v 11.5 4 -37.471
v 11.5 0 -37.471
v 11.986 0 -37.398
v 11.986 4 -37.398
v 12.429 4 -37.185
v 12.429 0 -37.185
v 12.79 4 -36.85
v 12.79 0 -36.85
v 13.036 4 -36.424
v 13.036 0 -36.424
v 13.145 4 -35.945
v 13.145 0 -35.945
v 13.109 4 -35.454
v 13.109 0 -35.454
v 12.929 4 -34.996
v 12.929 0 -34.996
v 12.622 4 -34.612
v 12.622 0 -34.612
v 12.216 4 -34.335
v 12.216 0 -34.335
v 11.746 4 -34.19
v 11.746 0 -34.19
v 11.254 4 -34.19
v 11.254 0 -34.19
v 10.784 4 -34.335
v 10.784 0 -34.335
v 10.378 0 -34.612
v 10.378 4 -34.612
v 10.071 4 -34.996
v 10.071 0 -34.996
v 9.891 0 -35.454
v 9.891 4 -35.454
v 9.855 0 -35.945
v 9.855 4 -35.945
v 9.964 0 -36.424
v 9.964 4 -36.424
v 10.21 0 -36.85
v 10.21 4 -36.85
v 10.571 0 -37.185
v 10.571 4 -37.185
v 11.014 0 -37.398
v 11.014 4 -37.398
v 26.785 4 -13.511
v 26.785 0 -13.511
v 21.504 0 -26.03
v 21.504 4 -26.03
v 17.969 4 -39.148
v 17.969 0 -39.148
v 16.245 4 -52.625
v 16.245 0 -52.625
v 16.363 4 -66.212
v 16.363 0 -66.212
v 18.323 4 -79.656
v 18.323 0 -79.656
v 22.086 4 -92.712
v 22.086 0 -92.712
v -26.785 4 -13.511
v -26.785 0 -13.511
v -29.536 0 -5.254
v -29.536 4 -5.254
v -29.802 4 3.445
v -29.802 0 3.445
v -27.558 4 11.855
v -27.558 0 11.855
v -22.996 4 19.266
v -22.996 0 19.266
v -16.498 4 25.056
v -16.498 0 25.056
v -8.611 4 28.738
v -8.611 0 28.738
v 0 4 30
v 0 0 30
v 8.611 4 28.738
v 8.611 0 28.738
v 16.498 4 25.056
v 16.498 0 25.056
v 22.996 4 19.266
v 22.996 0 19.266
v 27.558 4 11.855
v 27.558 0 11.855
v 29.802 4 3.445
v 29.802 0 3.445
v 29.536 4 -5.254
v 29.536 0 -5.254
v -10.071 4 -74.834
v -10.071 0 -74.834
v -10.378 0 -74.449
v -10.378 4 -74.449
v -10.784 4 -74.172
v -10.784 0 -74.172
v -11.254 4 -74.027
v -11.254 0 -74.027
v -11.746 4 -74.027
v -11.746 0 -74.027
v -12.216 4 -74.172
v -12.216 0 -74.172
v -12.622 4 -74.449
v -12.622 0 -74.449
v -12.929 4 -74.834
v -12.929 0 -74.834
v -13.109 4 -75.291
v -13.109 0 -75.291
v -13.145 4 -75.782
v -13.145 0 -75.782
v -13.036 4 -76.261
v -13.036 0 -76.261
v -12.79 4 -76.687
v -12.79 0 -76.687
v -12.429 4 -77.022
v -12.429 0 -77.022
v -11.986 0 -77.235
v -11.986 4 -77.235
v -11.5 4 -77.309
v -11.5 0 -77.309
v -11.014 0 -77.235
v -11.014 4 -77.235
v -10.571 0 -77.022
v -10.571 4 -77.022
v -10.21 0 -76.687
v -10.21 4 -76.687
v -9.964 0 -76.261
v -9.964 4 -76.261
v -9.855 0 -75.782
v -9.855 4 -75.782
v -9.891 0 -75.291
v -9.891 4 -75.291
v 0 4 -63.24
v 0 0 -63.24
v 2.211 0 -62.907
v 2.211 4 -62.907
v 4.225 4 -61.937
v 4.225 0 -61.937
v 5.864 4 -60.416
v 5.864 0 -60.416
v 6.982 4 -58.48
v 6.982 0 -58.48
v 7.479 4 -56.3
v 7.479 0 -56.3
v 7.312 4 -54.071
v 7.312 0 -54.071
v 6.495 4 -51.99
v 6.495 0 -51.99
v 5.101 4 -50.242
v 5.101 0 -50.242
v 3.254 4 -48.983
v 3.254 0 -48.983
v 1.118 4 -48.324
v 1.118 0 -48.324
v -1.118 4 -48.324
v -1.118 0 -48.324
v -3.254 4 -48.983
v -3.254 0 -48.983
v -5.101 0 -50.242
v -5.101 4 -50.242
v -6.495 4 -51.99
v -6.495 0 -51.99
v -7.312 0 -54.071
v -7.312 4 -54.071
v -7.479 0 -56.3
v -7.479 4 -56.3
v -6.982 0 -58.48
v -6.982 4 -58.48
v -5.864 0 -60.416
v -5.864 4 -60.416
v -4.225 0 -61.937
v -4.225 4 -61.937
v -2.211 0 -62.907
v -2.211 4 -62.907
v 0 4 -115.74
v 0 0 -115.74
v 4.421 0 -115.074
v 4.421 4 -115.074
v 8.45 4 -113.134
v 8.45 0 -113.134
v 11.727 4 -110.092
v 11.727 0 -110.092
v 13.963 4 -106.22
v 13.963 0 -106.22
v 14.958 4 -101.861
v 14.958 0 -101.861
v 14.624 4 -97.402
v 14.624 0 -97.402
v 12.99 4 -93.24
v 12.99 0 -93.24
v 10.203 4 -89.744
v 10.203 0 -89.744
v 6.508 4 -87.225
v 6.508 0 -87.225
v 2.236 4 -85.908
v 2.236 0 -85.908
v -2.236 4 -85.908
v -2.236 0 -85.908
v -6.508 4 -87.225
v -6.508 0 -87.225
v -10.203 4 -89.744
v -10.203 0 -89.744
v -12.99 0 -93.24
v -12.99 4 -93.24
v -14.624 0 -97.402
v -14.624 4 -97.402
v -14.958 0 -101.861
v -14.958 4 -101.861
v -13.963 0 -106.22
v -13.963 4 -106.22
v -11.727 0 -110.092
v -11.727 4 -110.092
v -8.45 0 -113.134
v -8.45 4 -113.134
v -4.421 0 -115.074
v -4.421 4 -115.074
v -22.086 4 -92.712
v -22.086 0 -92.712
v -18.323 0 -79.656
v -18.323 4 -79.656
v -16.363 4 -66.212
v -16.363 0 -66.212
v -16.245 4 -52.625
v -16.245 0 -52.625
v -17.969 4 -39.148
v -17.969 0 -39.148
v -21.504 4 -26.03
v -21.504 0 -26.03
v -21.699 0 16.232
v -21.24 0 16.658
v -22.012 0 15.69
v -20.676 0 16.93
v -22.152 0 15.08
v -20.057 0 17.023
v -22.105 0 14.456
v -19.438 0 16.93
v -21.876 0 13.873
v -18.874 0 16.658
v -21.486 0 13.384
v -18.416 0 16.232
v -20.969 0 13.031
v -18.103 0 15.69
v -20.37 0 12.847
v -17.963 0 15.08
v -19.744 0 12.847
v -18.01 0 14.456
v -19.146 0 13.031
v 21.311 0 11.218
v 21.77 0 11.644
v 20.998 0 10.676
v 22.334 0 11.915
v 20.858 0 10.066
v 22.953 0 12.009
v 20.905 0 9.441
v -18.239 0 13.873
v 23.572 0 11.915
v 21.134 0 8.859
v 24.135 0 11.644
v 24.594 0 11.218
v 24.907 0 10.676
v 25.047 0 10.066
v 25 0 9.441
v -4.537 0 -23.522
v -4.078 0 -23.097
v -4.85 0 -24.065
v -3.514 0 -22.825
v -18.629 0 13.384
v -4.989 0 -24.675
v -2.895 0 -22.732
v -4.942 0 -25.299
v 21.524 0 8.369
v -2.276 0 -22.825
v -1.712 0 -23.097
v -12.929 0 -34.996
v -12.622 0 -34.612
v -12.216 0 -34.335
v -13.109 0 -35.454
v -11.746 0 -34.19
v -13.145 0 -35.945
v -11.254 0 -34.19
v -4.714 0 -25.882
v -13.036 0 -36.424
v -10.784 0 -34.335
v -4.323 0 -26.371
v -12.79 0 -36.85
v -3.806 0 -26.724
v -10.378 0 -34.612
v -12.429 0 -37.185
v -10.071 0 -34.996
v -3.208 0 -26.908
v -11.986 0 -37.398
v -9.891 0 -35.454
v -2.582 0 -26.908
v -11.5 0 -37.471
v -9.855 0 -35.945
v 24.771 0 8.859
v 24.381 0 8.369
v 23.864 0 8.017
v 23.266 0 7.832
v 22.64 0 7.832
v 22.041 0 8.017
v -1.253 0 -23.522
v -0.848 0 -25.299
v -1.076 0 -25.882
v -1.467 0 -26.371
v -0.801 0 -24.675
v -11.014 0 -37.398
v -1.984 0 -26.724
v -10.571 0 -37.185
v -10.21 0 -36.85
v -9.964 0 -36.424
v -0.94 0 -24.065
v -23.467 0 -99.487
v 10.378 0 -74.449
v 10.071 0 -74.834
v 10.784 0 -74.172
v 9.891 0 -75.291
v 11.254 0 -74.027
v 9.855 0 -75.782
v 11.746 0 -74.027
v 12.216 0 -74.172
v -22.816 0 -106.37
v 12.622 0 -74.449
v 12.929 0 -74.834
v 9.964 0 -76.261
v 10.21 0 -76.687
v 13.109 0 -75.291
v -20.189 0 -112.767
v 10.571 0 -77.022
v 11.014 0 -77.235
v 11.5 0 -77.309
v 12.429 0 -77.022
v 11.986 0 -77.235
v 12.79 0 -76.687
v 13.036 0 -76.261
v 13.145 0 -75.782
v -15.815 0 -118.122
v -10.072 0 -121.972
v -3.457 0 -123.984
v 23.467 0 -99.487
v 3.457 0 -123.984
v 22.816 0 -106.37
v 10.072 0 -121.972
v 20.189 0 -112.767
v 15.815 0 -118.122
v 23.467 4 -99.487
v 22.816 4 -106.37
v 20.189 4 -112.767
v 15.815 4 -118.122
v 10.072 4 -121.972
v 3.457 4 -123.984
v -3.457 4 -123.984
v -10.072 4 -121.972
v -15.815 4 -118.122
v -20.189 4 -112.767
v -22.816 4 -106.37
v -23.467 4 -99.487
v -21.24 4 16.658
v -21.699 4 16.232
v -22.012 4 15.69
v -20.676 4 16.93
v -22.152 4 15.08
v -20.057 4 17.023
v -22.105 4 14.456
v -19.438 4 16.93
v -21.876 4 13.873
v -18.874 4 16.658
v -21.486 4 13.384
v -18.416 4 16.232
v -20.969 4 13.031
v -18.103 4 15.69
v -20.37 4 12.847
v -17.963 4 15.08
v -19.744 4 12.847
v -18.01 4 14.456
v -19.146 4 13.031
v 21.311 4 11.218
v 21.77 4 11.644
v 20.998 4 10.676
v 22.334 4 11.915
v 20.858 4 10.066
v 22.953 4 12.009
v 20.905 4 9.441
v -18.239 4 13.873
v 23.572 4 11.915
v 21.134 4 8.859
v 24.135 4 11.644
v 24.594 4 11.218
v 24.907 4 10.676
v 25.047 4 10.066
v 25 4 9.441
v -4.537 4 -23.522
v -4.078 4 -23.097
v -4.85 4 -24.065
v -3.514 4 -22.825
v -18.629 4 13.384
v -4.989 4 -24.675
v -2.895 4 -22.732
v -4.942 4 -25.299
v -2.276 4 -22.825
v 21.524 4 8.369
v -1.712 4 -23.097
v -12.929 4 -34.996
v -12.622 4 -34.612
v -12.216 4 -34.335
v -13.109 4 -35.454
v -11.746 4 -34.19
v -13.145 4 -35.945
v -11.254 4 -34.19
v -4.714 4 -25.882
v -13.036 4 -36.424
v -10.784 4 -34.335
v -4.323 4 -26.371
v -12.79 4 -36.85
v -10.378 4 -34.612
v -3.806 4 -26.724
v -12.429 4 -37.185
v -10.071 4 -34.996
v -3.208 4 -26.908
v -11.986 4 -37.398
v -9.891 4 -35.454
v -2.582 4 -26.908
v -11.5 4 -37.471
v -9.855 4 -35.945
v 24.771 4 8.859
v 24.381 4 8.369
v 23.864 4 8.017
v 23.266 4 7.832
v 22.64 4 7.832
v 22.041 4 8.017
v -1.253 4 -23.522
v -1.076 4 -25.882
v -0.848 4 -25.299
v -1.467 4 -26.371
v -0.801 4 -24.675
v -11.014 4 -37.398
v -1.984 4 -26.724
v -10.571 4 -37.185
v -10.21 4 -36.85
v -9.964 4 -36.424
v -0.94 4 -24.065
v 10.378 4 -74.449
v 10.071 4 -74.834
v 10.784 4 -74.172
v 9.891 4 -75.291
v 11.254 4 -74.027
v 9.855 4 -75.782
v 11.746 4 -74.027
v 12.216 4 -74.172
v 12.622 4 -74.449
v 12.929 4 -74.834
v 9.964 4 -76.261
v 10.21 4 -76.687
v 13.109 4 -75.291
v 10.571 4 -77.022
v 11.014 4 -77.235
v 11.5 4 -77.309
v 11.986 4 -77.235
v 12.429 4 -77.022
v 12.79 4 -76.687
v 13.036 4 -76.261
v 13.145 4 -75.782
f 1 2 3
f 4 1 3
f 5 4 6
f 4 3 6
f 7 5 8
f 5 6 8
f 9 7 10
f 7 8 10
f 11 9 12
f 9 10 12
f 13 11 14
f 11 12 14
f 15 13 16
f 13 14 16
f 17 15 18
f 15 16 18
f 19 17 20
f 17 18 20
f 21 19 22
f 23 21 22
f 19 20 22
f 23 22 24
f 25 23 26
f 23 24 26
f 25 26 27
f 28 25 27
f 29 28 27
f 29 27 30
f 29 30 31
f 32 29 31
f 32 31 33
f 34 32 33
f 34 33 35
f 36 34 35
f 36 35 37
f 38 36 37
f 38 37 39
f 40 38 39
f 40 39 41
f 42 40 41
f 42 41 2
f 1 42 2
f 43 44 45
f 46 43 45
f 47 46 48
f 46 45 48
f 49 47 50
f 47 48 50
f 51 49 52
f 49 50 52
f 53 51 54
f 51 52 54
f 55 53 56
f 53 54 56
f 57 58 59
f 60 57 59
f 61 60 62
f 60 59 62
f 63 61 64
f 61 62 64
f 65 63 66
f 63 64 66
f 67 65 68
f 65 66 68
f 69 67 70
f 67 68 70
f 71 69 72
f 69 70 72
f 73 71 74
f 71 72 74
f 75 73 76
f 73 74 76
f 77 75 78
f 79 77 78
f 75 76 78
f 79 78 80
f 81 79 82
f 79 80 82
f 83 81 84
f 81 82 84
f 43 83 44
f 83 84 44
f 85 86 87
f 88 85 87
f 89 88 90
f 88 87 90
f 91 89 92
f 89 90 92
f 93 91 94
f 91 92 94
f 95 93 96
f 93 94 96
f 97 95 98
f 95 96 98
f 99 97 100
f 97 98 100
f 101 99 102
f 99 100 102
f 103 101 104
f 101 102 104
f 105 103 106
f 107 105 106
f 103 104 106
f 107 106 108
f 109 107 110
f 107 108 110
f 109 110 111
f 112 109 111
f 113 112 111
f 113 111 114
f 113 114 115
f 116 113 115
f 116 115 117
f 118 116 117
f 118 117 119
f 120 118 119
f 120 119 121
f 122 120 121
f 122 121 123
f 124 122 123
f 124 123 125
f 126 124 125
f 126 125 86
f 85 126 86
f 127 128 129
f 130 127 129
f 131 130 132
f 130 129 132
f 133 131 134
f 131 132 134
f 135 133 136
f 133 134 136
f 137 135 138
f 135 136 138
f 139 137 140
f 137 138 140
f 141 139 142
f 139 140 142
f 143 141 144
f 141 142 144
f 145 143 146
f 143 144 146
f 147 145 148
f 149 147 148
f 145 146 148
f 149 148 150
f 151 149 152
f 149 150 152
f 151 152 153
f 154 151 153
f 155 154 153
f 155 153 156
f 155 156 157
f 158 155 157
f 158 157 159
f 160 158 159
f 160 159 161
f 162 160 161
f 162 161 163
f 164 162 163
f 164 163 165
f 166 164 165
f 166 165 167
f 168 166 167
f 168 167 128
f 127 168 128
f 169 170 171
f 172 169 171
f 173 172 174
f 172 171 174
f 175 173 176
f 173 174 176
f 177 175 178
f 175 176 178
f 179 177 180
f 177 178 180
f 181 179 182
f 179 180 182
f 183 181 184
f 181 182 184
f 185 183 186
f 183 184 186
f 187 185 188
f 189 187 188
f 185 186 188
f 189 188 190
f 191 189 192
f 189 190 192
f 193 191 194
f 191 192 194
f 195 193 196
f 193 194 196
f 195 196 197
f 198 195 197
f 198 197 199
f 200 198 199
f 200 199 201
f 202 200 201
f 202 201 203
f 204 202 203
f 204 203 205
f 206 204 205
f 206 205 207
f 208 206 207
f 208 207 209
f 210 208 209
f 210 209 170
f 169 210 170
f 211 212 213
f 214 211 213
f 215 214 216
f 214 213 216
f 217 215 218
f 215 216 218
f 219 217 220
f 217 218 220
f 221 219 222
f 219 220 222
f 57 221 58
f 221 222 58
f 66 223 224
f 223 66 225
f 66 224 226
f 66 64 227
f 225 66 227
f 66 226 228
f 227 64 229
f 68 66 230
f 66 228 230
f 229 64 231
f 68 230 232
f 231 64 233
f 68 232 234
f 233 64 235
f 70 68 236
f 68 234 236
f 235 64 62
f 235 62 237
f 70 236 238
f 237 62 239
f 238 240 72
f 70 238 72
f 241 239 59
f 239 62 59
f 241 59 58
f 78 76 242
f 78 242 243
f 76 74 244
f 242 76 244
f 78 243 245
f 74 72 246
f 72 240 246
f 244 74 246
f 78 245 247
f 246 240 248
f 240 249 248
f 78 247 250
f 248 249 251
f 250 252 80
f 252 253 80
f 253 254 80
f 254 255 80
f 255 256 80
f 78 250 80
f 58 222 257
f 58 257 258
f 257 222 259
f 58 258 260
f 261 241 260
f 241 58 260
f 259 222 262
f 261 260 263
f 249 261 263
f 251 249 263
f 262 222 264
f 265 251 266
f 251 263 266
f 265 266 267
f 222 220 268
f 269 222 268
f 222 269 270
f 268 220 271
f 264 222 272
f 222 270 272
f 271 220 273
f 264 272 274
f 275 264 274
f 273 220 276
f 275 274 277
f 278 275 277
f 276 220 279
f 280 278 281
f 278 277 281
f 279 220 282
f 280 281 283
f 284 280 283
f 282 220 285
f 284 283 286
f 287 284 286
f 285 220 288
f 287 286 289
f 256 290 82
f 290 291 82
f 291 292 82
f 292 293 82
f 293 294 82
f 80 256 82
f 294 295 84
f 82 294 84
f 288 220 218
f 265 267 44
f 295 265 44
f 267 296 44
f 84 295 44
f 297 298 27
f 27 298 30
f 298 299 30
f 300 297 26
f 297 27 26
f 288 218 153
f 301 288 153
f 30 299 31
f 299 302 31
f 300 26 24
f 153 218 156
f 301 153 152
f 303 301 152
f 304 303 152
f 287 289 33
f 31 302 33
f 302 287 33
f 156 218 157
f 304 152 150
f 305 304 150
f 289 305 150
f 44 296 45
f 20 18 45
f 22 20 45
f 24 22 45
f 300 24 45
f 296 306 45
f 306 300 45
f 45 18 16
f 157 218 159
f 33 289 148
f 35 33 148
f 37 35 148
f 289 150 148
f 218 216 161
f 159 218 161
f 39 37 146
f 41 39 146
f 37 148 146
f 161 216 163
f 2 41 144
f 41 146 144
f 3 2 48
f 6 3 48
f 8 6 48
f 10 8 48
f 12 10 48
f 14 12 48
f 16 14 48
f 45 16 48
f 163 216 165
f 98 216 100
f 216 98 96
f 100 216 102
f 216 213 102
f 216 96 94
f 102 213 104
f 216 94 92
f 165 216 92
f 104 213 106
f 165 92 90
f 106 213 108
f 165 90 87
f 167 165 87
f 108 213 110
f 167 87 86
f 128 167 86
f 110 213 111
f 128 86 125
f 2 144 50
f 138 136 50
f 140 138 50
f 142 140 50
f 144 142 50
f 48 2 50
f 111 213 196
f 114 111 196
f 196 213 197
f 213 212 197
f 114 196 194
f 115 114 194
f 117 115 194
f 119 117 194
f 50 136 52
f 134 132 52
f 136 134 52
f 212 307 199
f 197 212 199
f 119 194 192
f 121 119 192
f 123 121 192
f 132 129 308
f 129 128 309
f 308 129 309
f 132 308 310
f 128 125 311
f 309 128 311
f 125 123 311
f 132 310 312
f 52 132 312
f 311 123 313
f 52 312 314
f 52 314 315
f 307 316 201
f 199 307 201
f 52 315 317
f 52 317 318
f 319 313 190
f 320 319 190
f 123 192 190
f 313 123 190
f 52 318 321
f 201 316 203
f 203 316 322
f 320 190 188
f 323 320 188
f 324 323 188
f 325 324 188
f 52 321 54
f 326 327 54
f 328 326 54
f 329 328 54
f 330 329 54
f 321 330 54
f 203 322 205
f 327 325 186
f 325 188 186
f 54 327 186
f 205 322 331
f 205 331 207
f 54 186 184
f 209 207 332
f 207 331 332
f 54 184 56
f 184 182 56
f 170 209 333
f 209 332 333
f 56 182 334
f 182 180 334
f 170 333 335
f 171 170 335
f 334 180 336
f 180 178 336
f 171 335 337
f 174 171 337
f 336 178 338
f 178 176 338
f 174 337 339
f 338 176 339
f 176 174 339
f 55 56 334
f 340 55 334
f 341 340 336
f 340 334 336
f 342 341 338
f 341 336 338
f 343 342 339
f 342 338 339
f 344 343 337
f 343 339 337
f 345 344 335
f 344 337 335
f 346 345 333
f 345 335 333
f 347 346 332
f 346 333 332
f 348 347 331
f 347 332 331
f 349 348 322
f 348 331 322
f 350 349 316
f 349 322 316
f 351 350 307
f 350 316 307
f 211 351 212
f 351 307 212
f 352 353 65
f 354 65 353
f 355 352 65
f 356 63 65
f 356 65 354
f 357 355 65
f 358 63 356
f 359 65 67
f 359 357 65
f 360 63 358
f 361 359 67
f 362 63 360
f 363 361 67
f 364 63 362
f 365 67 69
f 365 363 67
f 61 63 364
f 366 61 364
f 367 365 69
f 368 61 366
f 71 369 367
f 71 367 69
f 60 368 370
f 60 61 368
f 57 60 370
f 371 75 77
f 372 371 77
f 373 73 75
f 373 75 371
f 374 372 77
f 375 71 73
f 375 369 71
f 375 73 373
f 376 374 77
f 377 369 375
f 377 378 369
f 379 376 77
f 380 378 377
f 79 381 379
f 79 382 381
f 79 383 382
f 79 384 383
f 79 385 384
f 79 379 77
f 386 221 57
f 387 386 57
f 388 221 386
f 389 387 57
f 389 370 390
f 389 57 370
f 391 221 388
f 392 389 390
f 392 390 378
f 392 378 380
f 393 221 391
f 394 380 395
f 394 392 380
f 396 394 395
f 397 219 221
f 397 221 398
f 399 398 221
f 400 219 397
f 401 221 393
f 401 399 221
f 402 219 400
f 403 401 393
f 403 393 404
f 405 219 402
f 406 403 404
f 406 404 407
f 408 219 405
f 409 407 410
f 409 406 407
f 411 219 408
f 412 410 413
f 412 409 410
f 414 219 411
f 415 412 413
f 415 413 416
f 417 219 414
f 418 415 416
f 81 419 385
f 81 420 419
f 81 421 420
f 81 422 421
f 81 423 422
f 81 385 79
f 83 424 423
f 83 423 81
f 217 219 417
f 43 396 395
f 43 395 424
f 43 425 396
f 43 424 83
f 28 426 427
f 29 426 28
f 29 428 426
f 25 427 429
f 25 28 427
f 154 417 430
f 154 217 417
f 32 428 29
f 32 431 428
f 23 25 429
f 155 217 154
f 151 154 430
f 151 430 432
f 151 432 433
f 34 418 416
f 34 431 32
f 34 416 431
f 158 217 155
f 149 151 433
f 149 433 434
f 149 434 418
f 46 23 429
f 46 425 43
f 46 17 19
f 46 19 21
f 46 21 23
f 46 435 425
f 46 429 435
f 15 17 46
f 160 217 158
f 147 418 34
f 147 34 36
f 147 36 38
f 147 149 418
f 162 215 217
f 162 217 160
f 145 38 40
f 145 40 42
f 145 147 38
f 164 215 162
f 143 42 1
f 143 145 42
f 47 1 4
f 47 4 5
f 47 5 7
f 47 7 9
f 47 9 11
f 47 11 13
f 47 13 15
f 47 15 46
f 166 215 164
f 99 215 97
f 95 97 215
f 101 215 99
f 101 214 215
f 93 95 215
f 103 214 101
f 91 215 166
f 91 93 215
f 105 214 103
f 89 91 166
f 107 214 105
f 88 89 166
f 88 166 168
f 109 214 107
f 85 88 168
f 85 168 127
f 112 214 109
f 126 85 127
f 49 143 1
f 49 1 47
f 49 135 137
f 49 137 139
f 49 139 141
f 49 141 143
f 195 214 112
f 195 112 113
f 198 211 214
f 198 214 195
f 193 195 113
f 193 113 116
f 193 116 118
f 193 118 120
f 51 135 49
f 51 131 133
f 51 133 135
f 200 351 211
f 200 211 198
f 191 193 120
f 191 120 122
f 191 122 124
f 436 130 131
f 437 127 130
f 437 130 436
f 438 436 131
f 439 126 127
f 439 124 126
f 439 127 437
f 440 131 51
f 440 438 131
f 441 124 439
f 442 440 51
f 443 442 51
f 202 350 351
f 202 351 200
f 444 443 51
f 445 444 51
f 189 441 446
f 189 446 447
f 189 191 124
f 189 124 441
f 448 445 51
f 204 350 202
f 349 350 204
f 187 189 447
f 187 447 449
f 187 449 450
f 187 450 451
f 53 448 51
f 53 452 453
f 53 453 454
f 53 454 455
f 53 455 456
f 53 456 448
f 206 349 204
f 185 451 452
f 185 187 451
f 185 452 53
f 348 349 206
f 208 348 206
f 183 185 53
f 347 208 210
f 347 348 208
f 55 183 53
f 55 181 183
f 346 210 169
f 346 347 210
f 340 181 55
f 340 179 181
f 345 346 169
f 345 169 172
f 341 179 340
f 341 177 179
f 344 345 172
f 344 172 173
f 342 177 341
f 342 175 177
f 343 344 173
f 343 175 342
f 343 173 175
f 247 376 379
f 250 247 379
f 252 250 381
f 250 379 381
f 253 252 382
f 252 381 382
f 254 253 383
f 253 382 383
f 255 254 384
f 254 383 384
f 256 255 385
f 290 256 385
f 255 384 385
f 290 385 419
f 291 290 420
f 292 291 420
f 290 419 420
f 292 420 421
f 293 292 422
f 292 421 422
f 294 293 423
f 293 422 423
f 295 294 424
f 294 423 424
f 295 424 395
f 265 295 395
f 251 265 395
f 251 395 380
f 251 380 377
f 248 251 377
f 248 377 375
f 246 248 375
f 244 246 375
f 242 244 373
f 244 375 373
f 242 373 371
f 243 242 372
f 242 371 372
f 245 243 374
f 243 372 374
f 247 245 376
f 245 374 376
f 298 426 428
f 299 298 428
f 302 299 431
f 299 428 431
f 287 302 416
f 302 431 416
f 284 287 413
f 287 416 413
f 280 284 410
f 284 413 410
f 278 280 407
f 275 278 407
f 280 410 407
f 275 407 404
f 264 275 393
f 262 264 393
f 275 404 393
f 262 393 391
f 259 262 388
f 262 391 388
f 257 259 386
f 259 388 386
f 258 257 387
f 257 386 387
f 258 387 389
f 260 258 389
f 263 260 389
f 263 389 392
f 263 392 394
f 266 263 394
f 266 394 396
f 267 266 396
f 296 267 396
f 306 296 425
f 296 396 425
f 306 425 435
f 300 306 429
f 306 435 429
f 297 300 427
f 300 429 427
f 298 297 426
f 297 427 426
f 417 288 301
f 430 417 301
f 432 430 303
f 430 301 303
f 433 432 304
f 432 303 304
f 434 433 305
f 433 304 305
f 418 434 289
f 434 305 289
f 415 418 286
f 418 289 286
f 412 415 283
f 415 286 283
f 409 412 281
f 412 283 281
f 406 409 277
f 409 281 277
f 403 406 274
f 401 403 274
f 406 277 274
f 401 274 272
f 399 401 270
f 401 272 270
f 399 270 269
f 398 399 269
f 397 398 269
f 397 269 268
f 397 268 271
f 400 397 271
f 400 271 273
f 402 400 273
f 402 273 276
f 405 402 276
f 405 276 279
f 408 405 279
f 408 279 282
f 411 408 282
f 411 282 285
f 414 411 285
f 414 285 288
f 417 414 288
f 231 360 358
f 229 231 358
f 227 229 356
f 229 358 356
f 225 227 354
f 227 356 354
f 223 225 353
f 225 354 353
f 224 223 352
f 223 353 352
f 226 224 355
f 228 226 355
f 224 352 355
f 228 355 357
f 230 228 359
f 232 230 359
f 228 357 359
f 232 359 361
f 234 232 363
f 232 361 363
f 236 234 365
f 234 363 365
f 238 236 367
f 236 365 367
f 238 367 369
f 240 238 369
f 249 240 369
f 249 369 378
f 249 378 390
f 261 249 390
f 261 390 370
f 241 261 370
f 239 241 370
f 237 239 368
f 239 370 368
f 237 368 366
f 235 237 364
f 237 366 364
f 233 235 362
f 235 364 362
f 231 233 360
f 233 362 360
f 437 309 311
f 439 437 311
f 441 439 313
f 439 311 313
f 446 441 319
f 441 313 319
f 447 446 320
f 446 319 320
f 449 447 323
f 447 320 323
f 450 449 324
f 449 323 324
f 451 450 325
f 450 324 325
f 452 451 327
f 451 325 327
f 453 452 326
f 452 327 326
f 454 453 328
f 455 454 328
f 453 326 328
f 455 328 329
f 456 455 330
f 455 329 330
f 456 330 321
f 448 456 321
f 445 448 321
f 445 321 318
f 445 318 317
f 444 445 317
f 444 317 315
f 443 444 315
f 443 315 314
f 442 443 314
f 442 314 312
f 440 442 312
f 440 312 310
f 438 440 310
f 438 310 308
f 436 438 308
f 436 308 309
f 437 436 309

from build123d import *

# Parameters (mm, degrees)
EXTRUDE_1_DEPTH          = 4
SKETCH_2_R               = 2.1
CUT_EXTRUDE_1_DEPTH      = 4
PATTERN_CIRCULAR_1_COUNT = 3
SKETCH_4_R               = 7.5
CUT_EXTRUDE_2_DEPTH      = 27.5
SKETCH_5_R               = 1.65
CUT_EXTRUDE_3_DEPTH      = 27.5
PATTERN_CIRCULAR_2_COUNT = 3
SKETCH_6_R               = 15
CUT_EXTRUDE_4_DEPTH      = 29.5


with BuildPart() as part:
    # 草图1 → 凸台-拉伸1 (new body)
    with BuildSketch(Plane(origin=(0, 0, 0), x_dir=(1, 0, 0), z_dir=(0, 1, 0))):
        with BuildLine():
            ThreePointArc((26.78524518, 13.511130252), (16.244949948, 52.625392683), (22.086079359, 92.711606726))
            ThreePointArc((22.086079359, 92.711606726), (0, 124.24), (-22.086079359, 92.711606726))
            ThreePointArc((-22.086079359, 92.711606726), (-16.244949948, 52.625392683), (-26.78524518, 13.511130252))
            ThreePointArc((-26.78524518, 13.511130252), (0, -30), (26.78524518, 13.511130252))
        make_face()
    extrude(amount=EXTRUDE_1_DEPTH)

    # 草图2 → 切除-拉伸1 (cut)
    with BuildSketch(Plane(origin=(0, 4, 0), x_dir=(1, 0, 0), z_dir=(0, 1, 0))):
        with Locations(Location((22.952521328, -9.908671188, 0), (0, 0, 270))):
            Circle(SKETCH_2_R)
    cut_extrude_1 = extrude(amount=-CUT_EXTRUDE_1_DEPTH, mode=Mode.SUBTRACT)

    # 阵列(圆周)1: 切除-拉伸1 ×3 about axis
    pattern_circular_1_axis = Axis((0, 0, 0), (0, 1, 0))
    for i in range(1, PATTERN_CIRCULAR_1_COUNT):
        add(cut_extrude_1.rotate(pattern_circular_1_axis, i * 360 / PATTERN_CIRCULAR_1_COUNT), mode=Mode.SUBTRACT)

    # 草图4 → 切除-拉伸2 (cut)
    with BuildSketch(Plane(origin=(0, 0, 0), x_dir=(-1, 0, 0), z_dir=(0, -1, 0))):
        with Locations(Location((0, 55.74, 0), (0, 0, 90))):
            Circle(SKETCH_4_R)
    extrude(amount=-CUT_EXTRUDE_2_DEPTH, mode=Mode.SUBTRACT)

    # 草图5 → 切除-拉伸3 (cut)
    with BuildSketch(Plane.XZ):
        with Locations(Location((-11.5, -35.821415713, 0), (0, 0, 270))):
            Circle(SKETCH_5_R)
        with Locations(Location((11.5, -35.821415713, 0), (0, 0, 270))):
            Circle(SKETCH_5_R)
    cut_extrude_3 = extrude(amount=-CUT_EXTRUDE_3_DEPTH, mode=Mode.SUBTRACT)

    # 阵列(圆周)2: 切除-拉伸3 ×3 about axis
    pattern_circular_2_axis = Axis((0, 0, -55.74), (0, 1, 0))
    for i in range(1, PATTERN_CIRCULAR_2_COUNT):
        add(cut_extrude_3.rotate(pattern_circular_2_axis, i * 360 / PATTERN_CIRCULAR_2_COUNT), mode=Mode.SUBTRACT)

    # 草图6 → 切除-拉伸4 (cut)
    with BuildSketch(Plane.XZ):
        with Locations(Location((0, -100.74, 0), (0, 0, 270))):
            Circle(SKETCH_6_R)
    extrude(amount=-CUT_EXTRUDE_4_DEPTH, mode=Mode.SUBTRACT)


solid = part.part
